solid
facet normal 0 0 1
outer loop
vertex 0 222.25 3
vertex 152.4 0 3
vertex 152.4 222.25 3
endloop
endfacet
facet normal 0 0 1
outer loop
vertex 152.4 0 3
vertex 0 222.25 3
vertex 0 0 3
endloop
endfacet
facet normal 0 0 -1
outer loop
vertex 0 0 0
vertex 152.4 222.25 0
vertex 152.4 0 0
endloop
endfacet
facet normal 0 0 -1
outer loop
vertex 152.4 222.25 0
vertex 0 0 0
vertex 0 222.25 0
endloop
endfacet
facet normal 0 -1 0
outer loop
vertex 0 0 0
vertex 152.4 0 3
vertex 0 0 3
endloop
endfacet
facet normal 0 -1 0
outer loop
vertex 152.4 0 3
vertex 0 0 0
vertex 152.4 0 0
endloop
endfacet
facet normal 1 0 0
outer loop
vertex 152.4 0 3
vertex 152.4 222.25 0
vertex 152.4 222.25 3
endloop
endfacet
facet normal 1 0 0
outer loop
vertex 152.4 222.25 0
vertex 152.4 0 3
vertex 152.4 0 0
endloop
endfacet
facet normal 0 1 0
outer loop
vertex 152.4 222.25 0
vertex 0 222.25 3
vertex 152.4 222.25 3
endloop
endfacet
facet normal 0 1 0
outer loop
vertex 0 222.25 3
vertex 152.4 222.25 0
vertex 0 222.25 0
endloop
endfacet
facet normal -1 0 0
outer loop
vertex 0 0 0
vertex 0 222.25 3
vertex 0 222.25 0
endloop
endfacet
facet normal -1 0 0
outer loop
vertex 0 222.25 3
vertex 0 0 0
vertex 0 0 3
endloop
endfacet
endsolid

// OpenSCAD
IN2MM = 25.4;

height = 8.75* IN2MM;
width = 6 * IN2MM;
thickness = 3;
pen_r = 3.6 / PI / 2;
n_holes = 35;

hole_percent = .6;

spacing = height / (n_holes + 1 - hole_percent);

hole_d = hole_percent * spacing;

union() {
    cube([width, height, thickness]);

    translate() {
        difference() {
            
            
            
        }
    }
}
